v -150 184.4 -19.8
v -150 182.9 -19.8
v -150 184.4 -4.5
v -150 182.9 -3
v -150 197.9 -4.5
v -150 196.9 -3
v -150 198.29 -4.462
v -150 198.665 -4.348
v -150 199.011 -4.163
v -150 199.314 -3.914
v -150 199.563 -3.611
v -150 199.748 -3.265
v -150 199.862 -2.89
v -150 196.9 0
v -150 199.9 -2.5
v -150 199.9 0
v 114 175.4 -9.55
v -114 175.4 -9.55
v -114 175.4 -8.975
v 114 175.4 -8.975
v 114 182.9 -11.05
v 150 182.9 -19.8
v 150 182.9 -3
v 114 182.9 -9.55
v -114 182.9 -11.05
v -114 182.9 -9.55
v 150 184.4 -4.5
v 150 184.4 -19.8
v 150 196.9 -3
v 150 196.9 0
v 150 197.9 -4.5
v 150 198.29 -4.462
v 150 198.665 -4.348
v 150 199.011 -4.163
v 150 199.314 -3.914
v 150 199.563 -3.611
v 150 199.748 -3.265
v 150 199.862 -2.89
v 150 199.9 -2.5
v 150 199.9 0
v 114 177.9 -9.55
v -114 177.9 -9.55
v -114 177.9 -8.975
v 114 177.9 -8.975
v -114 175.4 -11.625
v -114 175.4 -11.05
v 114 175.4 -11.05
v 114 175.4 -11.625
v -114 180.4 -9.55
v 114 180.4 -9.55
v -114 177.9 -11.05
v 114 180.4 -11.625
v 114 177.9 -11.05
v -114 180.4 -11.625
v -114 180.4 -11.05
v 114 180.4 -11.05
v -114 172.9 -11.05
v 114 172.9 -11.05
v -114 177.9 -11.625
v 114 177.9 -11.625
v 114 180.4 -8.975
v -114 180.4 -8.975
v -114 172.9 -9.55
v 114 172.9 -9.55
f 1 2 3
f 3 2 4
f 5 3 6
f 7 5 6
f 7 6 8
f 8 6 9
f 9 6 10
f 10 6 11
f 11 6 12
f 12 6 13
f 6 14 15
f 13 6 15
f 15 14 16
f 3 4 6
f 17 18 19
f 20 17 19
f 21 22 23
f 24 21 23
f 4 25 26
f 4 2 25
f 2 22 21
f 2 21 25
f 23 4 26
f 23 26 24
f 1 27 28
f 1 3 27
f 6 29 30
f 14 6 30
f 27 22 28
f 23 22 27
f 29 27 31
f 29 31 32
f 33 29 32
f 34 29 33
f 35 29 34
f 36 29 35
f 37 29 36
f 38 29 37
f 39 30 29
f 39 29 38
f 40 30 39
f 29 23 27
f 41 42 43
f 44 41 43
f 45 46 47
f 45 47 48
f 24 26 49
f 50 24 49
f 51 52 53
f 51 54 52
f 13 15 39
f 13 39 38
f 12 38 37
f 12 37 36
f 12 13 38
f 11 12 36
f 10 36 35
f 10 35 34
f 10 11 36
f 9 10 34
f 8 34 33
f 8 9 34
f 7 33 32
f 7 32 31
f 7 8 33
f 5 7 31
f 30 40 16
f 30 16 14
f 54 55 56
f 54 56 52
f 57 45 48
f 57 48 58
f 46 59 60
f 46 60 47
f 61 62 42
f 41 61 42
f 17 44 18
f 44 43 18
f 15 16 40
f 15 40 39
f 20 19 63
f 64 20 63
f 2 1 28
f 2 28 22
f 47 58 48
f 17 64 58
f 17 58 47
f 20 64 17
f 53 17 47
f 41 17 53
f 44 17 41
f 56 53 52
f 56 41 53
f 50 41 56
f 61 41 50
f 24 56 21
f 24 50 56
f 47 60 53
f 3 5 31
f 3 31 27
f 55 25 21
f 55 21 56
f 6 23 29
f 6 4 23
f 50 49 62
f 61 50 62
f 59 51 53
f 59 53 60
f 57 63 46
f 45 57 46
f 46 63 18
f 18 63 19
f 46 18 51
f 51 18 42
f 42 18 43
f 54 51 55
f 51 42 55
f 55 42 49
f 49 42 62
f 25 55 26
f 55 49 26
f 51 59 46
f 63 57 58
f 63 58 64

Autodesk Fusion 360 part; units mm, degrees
sketch "Facade" plane through (0, 0, 0) normal (0, 0, 1) x (1, 0, 0)
  line L0 (150, -200) -> (-150, -200)
  line L1 (-150, -200) -> (-150, 200)
  line L2 (-150, 200) -> (150, 200)
  line L3 (150, 200) -> (150, -200)
  line L4 (150, -200) -> (-150, 200) construction
  line L5 (-150, -200) -> (150, 200) construction
  dimension "d4" = 400
  dimension "d5" = 300
sketch "Sketch2" plane through (0, 0, 0) normal (1, 0, 0) x (0, 1, 0)
  line L0 (199.9, 0) -> (199.9, -4.5)
  line L1 (199.9, -4.5) -> (184.4, -4.5)
  line L2 (184.4, -4.5) -> (184.4, -19.8)
  line L3 (184.4, -19.8) -> (182.9, -19.8)
  line L4 (182.9, -19.8) -> (182.9, -3)
  line L5 (182.9, -3) -> (196.9, -3)
  line L6 (196.9, -3) -> (196.9, 0)
  line L7 (199.9, 0) -> (196.9, 0)
  point P0 (200, 0)
  dimension "Gap" = 0.1
  dimension "d7" = 3
  dimension "d8" = 1.5
  dimension "d9" = 14
  dimension "d10" = 19.8
  dimension "d11" = 3
  dimension "d13" = 1.5
extrude "Extrude1" add sketch "Sketch2" along normal mid plane 300 makes body 1
sketch "Sketch4" plane through (0, 0, 0) normal (1, 0, 0) x (0, 1, 0)
  line L0 (188.9002, -10.3) -> (164.1797, -10.3)
  line L1 (184.4, -19.8) -> (182.9, -19.8)
  line L2 (182.9, -11.05) -> (180.4, -11.05)
  line L3 (180.4, -11.05) -> (180.4, -11.625)
  line L4 (180.4, -11.625) -> (177.9, -11.05)
  line L5 (177.9, -11.05) -> (177.9, -11.625)
  line L6 (177.9, -11.625) -> (175.4, -11.05)
  line L7 (175.4, -11.05) -> (175.4, -11.625)
  line L8 (175.4, -11.625) -> (172.9, -11.05)
  line L9 (172.9, -11.05) -> (172.9, -10.3)
  line L10 (180.4, -9.55) -> (180.4, -8.975)
  line L11 (175.4, -8.975) -> (172.9, -9.55)
  line L12 (177.9, -9.55) -> (177.9, -8.975)
  line L13 (180.4, -8.975) -> (177.9, -9.55)
  line L14 (175.4, -9.55) -> (175.4, -8.975)
  line L15 (182.9, -9.55) -> (180.4, -9.55)
  line L16 (177.9, -8.975) -> (175.4, -9.55)
  line L17 (172.9, -9.55) -> (172.9, -10.3)
  line L18 (182.9, -19.8) -> (182.9, -3)
  dimension "d26" = 9.5
  dimension "d27" = 1.5
  dimension "d28" = 2.65
  dimension "d29" = 2.5
  dimension "d30" = 2.5
extrude "Extrude2" add sketch "Sketch4" along normal mid plane 228 bodies 1
fillet "Fillet1" radius 2 1 edges at (0, 199.9, -4.5) on bodies 1
sketch "Sketch5" plane through (0, 0, 0) normal (1, 0, 0) x (0, 1, 0)
  line L0 (200, -19) -> (182.9, -19)
  line L1 (182.9, -19) -> (182.9, -3)
  line L2 (182.9, -3) -> (200, -3)
  line L3 (200, -3) -> (200, -19)
  line L4 (182.9, -19.8) -> (182.9, -3)
  line L5 (182.9, -3) -> (196.9, -3)
  line L6 (-200, 0) -> (200, 0)
  line L7 (200, -3) -> (196.9, -3)
  line L8 (196.9, -3) -> (196.9, 0)
  line L9 (196.9, 0) -> (200, 0)
  line L10 (200, 0) -> (200, -3)
  line L11 (196.9, -3) -> (196.9, 0)
  point P0 (200, 0)
  dimension "FacadeThickness" = 19
extrude "Extrude3" add sketch "Sketch5" along normal mid plane 300 separate body makes body 2
sketch "Sketch6" plane through (0, 0, 0) normal (1, 0, 0) x (0, 1, 0)
  line L0 (171.9, -9.3) -> (182.9, -9.3)
  line L1 (182.9, -9.3) -> (182.9, -11.3)
  line L2 (182.9, -11.3) -> (171.9, -11.3)
  line L3 (171.9, -11.3) -> (171.9, -9.3)
  line L4 (171.9, -9.3) -> (182.9, -11.3) construction
  line L5 (182.9, -9.3) -> (171.9, -11.3) construction
  line L6 (172.9, -11.05) -> (172.9, -9.55)
  line L7 (182.9, -19) -> (182.9, -3)
  point P0 (177.4, -10.3)
  point P1 (172.9, -10.3)
  dimension "d39" = 2
  dimension "d40" = 1
extrude "Extrude4" add sketch "Sketch6" along normal mid plane 298 bodies 2
extrude "Extrude5" add 1 faces at (-150, 193.2667, -13.6667) along direction (-1, 0, 0) blind 0.01 on bodies 2 bodies 2
extrude "Extrude6" add 1 faces at (150, 193.2667, -13.6667) along direction (1, 0, 0) blind 0.01 on bodies 2 bodies 2
hidden bodies 2
equation "FacadeWidth = 300 mm"
equation "FacadeHeight = 400 mm"
equation "Shortening = 36 mm"
equation "d4 = FacadeHeight"
equation "d5 = FacadeWidth"
equation "Gap = 0.1 mm" comment "If gap is needed, please enter 20 mm"
equation "d8 = Thickness"
equation "Thickness = 1.5 mm"
equation "d13 = Thickness"
equation "d24 = FacadeWidth"
equation "d30 = d29"
equation "d31 = FacadeWidth - Shortening * 2"
equation "d37 = FacadeWidth"
equation "d41 = FacadeWidth - 2 mm"
properties part number "Hafele 126.35.945"
